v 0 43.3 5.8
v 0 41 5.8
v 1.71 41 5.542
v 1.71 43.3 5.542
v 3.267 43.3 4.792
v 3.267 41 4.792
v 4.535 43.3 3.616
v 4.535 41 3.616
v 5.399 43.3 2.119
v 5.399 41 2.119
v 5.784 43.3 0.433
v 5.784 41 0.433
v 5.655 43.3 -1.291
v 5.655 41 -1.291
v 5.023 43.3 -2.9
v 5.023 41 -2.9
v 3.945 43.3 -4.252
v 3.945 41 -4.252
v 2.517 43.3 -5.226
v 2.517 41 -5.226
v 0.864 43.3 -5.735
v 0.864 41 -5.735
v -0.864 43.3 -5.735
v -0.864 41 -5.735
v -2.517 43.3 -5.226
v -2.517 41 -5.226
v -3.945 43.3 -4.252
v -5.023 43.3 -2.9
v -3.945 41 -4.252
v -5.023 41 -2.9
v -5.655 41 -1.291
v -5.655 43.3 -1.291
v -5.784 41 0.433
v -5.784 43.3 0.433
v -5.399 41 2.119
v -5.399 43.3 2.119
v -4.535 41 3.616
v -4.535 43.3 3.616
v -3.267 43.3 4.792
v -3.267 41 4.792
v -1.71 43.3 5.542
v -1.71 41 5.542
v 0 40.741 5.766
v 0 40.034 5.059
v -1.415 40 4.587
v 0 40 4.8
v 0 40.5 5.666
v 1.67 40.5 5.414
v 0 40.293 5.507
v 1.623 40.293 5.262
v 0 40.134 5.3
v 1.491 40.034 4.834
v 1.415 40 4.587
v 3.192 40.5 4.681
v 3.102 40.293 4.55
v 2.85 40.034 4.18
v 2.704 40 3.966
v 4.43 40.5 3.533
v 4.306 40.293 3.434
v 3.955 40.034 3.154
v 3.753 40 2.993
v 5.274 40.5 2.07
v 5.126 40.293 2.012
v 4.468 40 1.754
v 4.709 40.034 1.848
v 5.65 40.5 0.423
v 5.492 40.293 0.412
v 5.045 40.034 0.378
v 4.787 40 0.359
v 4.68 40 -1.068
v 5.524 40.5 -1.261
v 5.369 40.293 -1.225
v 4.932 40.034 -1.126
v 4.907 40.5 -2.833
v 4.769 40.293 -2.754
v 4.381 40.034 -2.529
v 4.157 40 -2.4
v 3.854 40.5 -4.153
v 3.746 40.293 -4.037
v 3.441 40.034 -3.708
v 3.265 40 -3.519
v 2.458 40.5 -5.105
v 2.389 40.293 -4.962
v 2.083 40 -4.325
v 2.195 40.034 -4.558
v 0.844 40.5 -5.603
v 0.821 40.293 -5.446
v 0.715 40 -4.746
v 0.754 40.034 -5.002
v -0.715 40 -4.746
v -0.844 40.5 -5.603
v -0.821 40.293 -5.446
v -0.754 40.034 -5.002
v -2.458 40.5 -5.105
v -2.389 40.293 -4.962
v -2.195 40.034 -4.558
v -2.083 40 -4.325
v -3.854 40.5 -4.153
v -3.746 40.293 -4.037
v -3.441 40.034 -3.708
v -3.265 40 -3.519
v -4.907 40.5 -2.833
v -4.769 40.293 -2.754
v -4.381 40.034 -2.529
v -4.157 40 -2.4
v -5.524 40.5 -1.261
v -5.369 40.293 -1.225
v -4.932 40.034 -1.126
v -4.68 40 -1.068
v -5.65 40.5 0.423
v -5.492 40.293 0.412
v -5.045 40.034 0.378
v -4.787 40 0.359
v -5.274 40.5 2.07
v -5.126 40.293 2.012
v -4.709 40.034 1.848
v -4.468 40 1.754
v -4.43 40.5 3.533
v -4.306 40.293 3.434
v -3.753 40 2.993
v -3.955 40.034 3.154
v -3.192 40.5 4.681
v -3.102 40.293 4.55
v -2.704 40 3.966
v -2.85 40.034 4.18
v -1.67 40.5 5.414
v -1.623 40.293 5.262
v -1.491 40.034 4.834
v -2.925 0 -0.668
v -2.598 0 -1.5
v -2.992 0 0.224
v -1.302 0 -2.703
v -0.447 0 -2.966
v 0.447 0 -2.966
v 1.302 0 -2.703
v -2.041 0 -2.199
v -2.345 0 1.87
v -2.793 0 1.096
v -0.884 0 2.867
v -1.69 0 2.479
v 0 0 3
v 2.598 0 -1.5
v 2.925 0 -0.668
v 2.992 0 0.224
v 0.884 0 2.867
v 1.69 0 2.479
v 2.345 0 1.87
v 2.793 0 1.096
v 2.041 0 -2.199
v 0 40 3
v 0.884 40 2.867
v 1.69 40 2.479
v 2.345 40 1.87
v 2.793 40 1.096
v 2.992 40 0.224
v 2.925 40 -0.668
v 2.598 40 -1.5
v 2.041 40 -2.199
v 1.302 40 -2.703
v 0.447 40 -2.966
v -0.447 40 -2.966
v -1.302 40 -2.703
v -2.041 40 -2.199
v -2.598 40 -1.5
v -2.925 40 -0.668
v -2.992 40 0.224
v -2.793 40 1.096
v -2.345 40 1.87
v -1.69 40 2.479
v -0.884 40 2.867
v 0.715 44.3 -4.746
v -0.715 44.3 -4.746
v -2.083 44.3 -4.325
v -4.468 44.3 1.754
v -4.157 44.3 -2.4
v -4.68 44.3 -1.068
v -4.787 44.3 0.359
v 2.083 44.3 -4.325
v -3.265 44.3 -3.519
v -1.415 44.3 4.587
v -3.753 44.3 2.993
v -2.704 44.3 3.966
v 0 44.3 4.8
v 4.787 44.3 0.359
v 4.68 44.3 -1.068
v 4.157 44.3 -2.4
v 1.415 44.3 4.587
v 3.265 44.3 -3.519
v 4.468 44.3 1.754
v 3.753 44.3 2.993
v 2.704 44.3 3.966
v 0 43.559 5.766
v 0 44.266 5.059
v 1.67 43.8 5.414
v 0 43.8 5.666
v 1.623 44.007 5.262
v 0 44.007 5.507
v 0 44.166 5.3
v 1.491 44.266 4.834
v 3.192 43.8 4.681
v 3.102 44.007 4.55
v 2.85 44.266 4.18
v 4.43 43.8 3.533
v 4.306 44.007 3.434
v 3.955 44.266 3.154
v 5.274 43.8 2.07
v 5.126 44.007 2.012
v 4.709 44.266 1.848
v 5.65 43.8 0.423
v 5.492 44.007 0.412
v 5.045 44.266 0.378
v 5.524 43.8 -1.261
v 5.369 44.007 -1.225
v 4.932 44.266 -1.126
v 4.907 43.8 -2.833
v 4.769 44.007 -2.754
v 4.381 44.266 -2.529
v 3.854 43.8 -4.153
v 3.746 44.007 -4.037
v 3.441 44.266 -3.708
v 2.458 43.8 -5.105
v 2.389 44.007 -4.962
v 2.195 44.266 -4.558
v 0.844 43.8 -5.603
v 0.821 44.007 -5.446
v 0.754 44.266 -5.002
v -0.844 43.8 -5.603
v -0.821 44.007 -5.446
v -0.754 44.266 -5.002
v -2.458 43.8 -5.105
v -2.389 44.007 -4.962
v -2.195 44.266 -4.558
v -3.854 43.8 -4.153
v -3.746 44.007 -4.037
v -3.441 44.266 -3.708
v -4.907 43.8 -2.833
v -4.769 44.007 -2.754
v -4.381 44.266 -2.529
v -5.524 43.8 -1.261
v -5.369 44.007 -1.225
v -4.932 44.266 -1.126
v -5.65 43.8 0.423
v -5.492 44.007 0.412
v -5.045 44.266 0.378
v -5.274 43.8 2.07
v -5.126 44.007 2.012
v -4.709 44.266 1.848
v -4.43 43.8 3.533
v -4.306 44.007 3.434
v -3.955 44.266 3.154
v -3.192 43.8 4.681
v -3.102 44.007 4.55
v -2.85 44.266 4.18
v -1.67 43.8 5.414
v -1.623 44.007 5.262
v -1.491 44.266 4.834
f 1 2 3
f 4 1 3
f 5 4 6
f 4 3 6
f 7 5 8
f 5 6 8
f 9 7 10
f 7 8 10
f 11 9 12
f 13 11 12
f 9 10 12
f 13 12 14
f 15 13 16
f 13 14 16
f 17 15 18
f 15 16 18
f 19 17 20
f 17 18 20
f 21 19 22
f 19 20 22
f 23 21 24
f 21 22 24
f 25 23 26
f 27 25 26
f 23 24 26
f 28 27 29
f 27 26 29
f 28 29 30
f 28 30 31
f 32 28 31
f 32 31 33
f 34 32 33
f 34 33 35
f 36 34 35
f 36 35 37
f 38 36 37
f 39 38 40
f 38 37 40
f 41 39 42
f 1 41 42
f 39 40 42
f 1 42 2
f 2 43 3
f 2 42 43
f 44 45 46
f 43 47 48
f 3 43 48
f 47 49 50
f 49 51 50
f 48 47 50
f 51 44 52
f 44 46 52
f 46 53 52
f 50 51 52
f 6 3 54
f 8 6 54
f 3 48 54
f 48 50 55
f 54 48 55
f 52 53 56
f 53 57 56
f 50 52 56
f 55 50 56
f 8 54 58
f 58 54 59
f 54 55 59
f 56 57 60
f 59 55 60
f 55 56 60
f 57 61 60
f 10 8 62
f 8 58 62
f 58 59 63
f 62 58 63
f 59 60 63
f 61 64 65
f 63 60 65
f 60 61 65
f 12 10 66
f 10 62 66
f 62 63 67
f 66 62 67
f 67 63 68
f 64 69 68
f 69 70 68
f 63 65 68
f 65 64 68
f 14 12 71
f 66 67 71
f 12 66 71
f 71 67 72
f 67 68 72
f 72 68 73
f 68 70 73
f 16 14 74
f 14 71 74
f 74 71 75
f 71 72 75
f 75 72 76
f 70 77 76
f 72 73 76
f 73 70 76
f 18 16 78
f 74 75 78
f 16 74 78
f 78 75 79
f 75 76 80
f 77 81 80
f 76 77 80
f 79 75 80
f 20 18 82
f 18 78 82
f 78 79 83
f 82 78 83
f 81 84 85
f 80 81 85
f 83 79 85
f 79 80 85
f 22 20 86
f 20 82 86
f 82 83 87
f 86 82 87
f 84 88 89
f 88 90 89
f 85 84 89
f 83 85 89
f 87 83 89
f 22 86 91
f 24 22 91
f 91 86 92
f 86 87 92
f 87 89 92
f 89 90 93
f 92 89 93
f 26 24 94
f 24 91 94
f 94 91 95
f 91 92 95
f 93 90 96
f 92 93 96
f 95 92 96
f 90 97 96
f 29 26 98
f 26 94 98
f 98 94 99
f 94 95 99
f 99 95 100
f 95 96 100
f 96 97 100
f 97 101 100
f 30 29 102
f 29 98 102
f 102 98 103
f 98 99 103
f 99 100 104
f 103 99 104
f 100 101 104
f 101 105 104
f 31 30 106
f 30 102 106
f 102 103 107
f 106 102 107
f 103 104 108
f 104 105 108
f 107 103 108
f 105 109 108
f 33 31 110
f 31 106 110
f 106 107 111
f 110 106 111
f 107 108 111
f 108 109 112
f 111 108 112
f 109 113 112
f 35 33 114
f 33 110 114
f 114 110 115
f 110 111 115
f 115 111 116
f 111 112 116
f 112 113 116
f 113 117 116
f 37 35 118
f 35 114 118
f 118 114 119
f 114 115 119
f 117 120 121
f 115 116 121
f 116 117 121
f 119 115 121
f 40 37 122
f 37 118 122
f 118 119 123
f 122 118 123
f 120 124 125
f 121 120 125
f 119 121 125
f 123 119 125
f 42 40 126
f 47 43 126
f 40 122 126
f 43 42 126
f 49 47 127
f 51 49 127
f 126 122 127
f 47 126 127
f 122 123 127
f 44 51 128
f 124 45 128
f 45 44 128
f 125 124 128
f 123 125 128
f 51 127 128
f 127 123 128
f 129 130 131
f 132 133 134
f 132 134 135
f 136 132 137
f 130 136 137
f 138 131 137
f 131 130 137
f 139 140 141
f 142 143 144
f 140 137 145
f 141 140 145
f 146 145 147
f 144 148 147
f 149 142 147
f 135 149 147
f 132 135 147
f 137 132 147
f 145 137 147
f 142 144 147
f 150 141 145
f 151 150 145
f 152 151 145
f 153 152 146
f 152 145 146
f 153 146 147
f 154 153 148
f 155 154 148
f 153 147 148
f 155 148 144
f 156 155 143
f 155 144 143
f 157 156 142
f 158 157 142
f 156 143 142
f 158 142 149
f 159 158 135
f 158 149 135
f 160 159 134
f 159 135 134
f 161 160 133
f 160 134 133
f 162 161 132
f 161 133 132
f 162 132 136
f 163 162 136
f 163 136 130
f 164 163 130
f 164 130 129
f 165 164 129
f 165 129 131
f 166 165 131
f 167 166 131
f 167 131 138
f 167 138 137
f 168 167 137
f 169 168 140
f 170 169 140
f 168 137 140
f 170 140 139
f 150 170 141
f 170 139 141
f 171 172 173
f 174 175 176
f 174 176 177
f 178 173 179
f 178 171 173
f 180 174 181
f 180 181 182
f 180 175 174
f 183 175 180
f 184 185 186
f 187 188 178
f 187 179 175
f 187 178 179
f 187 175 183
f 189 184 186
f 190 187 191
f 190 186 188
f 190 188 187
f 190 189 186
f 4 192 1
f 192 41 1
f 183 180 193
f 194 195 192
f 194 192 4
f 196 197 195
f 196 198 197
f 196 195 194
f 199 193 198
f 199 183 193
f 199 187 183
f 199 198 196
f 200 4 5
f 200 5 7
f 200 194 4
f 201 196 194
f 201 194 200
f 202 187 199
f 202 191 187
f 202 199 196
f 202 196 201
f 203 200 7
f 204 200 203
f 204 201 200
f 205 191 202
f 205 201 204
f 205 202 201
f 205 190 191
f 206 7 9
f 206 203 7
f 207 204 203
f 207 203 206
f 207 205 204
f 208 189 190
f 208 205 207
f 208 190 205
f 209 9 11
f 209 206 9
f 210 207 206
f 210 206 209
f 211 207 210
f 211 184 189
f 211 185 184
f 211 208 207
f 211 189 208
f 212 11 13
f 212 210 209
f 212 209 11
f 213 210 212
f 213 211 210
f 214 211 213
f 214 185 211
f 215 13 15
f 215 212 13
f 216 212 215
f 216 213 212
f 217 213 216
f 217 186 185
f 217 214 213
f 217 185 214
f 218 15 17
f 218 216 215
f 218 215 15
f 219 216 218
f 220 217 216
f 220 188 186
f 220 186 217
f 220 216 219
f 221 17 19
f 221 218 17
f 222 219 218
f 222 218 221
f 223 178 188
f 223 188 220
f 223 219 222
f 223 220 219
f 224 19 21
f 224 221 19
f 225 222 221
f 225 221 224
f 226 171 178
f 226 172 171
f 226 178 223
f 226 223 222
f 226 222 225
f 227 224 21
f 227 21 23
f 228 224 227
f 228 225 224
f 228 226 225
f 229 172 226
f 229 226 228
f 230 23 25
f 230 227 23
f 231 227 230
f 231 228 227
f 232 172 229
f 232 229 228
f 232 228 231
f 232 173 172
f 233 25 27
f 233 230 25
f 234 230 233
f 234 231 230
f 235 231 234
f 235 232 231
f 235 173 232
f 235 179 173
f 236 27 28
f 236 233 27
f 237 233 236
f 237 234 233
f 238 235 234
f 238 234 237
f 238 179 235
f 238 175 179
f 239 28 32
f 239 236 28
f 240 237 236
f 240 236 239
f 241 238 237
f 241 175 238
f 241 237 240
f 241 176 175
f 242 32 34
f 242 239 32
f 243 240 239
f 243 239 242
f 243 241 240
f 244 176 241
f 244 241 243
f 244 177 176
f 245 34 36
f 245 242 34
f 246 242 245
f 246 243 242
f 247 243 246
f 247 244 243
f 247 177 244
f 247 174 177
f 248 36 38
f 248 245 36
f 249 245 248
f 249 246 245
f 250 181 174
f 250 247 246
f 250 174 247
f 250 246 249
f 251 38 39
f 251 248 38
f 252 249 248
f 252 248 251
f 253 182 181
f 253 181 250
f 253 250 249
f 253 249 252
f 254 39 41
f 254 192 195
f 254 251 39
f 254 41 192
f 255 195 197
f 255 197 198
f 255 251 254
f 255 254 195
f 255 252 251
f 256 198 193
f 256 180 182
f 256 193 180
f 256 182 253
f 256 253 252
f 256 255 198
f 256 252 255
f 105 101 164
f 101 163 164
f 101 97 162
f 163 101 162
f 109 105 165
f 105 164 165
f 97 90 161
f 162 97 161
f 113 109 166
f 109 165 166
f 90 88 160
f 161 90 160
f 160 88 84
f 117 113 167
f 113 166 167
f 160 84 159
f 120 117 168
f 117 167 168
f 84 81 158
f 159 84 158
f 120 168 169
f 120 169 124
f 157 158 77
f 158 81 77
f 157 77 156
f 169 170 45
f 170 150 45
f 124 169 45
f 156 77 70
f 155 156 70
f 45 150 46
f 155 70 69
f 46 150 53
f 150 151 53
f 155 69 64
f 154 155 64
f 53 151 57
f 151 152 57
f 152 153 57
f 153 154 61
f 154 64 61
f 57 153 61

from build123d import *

# Parameters (mm, degrees)
SKETCH1_R           = 3
BOSS_EXTRUDE1_DEPTH = 40
SKETCH2_R           = 5.8
BOSS_EXTRUDE2_DEPTH = 4.3
FILLET1_R           = 1


with BuildPart() as part:
    # Sketch1 → Boss-Extrude1 (new body)
    with BuildSketch(Plane(origin=(0, 0, 0), x_dir=(1, 0, 0), z_dir=(0, 1, 0))):
        with Locations(Location((0, 0, 0), (0, 0, 270))):  # turned: the seam where the file's is
            Circle(SKETCH1_R)
    extrude(amount=BOSS_EXTRUDE1_DEPTH)

    # Sketch2 → Boss-Extrude2 (add)
    with BuildSketch(Plane(origin=(0, 40, 0), x_dir=(1, 0, 0), z_dir=(0, 1, 0))):
        with Locations(Location((0, 0, 0), (0, 0, 270))):  # turned: the seam where the file's is
            Circle(SKETCH2_R)
    extrude(amount=BOSS_EXTRUDE2_DEPTH)

    # Fillet1
    fillet1_edges = [part.edges().sort_by_distance(p)[0] for p in [
        (0, 40, -5.8),
        (0, 44.3, -5.8),
    ]]
    fillet(fillet1_edges, radius=FILLET1_R)


solid = part.part
